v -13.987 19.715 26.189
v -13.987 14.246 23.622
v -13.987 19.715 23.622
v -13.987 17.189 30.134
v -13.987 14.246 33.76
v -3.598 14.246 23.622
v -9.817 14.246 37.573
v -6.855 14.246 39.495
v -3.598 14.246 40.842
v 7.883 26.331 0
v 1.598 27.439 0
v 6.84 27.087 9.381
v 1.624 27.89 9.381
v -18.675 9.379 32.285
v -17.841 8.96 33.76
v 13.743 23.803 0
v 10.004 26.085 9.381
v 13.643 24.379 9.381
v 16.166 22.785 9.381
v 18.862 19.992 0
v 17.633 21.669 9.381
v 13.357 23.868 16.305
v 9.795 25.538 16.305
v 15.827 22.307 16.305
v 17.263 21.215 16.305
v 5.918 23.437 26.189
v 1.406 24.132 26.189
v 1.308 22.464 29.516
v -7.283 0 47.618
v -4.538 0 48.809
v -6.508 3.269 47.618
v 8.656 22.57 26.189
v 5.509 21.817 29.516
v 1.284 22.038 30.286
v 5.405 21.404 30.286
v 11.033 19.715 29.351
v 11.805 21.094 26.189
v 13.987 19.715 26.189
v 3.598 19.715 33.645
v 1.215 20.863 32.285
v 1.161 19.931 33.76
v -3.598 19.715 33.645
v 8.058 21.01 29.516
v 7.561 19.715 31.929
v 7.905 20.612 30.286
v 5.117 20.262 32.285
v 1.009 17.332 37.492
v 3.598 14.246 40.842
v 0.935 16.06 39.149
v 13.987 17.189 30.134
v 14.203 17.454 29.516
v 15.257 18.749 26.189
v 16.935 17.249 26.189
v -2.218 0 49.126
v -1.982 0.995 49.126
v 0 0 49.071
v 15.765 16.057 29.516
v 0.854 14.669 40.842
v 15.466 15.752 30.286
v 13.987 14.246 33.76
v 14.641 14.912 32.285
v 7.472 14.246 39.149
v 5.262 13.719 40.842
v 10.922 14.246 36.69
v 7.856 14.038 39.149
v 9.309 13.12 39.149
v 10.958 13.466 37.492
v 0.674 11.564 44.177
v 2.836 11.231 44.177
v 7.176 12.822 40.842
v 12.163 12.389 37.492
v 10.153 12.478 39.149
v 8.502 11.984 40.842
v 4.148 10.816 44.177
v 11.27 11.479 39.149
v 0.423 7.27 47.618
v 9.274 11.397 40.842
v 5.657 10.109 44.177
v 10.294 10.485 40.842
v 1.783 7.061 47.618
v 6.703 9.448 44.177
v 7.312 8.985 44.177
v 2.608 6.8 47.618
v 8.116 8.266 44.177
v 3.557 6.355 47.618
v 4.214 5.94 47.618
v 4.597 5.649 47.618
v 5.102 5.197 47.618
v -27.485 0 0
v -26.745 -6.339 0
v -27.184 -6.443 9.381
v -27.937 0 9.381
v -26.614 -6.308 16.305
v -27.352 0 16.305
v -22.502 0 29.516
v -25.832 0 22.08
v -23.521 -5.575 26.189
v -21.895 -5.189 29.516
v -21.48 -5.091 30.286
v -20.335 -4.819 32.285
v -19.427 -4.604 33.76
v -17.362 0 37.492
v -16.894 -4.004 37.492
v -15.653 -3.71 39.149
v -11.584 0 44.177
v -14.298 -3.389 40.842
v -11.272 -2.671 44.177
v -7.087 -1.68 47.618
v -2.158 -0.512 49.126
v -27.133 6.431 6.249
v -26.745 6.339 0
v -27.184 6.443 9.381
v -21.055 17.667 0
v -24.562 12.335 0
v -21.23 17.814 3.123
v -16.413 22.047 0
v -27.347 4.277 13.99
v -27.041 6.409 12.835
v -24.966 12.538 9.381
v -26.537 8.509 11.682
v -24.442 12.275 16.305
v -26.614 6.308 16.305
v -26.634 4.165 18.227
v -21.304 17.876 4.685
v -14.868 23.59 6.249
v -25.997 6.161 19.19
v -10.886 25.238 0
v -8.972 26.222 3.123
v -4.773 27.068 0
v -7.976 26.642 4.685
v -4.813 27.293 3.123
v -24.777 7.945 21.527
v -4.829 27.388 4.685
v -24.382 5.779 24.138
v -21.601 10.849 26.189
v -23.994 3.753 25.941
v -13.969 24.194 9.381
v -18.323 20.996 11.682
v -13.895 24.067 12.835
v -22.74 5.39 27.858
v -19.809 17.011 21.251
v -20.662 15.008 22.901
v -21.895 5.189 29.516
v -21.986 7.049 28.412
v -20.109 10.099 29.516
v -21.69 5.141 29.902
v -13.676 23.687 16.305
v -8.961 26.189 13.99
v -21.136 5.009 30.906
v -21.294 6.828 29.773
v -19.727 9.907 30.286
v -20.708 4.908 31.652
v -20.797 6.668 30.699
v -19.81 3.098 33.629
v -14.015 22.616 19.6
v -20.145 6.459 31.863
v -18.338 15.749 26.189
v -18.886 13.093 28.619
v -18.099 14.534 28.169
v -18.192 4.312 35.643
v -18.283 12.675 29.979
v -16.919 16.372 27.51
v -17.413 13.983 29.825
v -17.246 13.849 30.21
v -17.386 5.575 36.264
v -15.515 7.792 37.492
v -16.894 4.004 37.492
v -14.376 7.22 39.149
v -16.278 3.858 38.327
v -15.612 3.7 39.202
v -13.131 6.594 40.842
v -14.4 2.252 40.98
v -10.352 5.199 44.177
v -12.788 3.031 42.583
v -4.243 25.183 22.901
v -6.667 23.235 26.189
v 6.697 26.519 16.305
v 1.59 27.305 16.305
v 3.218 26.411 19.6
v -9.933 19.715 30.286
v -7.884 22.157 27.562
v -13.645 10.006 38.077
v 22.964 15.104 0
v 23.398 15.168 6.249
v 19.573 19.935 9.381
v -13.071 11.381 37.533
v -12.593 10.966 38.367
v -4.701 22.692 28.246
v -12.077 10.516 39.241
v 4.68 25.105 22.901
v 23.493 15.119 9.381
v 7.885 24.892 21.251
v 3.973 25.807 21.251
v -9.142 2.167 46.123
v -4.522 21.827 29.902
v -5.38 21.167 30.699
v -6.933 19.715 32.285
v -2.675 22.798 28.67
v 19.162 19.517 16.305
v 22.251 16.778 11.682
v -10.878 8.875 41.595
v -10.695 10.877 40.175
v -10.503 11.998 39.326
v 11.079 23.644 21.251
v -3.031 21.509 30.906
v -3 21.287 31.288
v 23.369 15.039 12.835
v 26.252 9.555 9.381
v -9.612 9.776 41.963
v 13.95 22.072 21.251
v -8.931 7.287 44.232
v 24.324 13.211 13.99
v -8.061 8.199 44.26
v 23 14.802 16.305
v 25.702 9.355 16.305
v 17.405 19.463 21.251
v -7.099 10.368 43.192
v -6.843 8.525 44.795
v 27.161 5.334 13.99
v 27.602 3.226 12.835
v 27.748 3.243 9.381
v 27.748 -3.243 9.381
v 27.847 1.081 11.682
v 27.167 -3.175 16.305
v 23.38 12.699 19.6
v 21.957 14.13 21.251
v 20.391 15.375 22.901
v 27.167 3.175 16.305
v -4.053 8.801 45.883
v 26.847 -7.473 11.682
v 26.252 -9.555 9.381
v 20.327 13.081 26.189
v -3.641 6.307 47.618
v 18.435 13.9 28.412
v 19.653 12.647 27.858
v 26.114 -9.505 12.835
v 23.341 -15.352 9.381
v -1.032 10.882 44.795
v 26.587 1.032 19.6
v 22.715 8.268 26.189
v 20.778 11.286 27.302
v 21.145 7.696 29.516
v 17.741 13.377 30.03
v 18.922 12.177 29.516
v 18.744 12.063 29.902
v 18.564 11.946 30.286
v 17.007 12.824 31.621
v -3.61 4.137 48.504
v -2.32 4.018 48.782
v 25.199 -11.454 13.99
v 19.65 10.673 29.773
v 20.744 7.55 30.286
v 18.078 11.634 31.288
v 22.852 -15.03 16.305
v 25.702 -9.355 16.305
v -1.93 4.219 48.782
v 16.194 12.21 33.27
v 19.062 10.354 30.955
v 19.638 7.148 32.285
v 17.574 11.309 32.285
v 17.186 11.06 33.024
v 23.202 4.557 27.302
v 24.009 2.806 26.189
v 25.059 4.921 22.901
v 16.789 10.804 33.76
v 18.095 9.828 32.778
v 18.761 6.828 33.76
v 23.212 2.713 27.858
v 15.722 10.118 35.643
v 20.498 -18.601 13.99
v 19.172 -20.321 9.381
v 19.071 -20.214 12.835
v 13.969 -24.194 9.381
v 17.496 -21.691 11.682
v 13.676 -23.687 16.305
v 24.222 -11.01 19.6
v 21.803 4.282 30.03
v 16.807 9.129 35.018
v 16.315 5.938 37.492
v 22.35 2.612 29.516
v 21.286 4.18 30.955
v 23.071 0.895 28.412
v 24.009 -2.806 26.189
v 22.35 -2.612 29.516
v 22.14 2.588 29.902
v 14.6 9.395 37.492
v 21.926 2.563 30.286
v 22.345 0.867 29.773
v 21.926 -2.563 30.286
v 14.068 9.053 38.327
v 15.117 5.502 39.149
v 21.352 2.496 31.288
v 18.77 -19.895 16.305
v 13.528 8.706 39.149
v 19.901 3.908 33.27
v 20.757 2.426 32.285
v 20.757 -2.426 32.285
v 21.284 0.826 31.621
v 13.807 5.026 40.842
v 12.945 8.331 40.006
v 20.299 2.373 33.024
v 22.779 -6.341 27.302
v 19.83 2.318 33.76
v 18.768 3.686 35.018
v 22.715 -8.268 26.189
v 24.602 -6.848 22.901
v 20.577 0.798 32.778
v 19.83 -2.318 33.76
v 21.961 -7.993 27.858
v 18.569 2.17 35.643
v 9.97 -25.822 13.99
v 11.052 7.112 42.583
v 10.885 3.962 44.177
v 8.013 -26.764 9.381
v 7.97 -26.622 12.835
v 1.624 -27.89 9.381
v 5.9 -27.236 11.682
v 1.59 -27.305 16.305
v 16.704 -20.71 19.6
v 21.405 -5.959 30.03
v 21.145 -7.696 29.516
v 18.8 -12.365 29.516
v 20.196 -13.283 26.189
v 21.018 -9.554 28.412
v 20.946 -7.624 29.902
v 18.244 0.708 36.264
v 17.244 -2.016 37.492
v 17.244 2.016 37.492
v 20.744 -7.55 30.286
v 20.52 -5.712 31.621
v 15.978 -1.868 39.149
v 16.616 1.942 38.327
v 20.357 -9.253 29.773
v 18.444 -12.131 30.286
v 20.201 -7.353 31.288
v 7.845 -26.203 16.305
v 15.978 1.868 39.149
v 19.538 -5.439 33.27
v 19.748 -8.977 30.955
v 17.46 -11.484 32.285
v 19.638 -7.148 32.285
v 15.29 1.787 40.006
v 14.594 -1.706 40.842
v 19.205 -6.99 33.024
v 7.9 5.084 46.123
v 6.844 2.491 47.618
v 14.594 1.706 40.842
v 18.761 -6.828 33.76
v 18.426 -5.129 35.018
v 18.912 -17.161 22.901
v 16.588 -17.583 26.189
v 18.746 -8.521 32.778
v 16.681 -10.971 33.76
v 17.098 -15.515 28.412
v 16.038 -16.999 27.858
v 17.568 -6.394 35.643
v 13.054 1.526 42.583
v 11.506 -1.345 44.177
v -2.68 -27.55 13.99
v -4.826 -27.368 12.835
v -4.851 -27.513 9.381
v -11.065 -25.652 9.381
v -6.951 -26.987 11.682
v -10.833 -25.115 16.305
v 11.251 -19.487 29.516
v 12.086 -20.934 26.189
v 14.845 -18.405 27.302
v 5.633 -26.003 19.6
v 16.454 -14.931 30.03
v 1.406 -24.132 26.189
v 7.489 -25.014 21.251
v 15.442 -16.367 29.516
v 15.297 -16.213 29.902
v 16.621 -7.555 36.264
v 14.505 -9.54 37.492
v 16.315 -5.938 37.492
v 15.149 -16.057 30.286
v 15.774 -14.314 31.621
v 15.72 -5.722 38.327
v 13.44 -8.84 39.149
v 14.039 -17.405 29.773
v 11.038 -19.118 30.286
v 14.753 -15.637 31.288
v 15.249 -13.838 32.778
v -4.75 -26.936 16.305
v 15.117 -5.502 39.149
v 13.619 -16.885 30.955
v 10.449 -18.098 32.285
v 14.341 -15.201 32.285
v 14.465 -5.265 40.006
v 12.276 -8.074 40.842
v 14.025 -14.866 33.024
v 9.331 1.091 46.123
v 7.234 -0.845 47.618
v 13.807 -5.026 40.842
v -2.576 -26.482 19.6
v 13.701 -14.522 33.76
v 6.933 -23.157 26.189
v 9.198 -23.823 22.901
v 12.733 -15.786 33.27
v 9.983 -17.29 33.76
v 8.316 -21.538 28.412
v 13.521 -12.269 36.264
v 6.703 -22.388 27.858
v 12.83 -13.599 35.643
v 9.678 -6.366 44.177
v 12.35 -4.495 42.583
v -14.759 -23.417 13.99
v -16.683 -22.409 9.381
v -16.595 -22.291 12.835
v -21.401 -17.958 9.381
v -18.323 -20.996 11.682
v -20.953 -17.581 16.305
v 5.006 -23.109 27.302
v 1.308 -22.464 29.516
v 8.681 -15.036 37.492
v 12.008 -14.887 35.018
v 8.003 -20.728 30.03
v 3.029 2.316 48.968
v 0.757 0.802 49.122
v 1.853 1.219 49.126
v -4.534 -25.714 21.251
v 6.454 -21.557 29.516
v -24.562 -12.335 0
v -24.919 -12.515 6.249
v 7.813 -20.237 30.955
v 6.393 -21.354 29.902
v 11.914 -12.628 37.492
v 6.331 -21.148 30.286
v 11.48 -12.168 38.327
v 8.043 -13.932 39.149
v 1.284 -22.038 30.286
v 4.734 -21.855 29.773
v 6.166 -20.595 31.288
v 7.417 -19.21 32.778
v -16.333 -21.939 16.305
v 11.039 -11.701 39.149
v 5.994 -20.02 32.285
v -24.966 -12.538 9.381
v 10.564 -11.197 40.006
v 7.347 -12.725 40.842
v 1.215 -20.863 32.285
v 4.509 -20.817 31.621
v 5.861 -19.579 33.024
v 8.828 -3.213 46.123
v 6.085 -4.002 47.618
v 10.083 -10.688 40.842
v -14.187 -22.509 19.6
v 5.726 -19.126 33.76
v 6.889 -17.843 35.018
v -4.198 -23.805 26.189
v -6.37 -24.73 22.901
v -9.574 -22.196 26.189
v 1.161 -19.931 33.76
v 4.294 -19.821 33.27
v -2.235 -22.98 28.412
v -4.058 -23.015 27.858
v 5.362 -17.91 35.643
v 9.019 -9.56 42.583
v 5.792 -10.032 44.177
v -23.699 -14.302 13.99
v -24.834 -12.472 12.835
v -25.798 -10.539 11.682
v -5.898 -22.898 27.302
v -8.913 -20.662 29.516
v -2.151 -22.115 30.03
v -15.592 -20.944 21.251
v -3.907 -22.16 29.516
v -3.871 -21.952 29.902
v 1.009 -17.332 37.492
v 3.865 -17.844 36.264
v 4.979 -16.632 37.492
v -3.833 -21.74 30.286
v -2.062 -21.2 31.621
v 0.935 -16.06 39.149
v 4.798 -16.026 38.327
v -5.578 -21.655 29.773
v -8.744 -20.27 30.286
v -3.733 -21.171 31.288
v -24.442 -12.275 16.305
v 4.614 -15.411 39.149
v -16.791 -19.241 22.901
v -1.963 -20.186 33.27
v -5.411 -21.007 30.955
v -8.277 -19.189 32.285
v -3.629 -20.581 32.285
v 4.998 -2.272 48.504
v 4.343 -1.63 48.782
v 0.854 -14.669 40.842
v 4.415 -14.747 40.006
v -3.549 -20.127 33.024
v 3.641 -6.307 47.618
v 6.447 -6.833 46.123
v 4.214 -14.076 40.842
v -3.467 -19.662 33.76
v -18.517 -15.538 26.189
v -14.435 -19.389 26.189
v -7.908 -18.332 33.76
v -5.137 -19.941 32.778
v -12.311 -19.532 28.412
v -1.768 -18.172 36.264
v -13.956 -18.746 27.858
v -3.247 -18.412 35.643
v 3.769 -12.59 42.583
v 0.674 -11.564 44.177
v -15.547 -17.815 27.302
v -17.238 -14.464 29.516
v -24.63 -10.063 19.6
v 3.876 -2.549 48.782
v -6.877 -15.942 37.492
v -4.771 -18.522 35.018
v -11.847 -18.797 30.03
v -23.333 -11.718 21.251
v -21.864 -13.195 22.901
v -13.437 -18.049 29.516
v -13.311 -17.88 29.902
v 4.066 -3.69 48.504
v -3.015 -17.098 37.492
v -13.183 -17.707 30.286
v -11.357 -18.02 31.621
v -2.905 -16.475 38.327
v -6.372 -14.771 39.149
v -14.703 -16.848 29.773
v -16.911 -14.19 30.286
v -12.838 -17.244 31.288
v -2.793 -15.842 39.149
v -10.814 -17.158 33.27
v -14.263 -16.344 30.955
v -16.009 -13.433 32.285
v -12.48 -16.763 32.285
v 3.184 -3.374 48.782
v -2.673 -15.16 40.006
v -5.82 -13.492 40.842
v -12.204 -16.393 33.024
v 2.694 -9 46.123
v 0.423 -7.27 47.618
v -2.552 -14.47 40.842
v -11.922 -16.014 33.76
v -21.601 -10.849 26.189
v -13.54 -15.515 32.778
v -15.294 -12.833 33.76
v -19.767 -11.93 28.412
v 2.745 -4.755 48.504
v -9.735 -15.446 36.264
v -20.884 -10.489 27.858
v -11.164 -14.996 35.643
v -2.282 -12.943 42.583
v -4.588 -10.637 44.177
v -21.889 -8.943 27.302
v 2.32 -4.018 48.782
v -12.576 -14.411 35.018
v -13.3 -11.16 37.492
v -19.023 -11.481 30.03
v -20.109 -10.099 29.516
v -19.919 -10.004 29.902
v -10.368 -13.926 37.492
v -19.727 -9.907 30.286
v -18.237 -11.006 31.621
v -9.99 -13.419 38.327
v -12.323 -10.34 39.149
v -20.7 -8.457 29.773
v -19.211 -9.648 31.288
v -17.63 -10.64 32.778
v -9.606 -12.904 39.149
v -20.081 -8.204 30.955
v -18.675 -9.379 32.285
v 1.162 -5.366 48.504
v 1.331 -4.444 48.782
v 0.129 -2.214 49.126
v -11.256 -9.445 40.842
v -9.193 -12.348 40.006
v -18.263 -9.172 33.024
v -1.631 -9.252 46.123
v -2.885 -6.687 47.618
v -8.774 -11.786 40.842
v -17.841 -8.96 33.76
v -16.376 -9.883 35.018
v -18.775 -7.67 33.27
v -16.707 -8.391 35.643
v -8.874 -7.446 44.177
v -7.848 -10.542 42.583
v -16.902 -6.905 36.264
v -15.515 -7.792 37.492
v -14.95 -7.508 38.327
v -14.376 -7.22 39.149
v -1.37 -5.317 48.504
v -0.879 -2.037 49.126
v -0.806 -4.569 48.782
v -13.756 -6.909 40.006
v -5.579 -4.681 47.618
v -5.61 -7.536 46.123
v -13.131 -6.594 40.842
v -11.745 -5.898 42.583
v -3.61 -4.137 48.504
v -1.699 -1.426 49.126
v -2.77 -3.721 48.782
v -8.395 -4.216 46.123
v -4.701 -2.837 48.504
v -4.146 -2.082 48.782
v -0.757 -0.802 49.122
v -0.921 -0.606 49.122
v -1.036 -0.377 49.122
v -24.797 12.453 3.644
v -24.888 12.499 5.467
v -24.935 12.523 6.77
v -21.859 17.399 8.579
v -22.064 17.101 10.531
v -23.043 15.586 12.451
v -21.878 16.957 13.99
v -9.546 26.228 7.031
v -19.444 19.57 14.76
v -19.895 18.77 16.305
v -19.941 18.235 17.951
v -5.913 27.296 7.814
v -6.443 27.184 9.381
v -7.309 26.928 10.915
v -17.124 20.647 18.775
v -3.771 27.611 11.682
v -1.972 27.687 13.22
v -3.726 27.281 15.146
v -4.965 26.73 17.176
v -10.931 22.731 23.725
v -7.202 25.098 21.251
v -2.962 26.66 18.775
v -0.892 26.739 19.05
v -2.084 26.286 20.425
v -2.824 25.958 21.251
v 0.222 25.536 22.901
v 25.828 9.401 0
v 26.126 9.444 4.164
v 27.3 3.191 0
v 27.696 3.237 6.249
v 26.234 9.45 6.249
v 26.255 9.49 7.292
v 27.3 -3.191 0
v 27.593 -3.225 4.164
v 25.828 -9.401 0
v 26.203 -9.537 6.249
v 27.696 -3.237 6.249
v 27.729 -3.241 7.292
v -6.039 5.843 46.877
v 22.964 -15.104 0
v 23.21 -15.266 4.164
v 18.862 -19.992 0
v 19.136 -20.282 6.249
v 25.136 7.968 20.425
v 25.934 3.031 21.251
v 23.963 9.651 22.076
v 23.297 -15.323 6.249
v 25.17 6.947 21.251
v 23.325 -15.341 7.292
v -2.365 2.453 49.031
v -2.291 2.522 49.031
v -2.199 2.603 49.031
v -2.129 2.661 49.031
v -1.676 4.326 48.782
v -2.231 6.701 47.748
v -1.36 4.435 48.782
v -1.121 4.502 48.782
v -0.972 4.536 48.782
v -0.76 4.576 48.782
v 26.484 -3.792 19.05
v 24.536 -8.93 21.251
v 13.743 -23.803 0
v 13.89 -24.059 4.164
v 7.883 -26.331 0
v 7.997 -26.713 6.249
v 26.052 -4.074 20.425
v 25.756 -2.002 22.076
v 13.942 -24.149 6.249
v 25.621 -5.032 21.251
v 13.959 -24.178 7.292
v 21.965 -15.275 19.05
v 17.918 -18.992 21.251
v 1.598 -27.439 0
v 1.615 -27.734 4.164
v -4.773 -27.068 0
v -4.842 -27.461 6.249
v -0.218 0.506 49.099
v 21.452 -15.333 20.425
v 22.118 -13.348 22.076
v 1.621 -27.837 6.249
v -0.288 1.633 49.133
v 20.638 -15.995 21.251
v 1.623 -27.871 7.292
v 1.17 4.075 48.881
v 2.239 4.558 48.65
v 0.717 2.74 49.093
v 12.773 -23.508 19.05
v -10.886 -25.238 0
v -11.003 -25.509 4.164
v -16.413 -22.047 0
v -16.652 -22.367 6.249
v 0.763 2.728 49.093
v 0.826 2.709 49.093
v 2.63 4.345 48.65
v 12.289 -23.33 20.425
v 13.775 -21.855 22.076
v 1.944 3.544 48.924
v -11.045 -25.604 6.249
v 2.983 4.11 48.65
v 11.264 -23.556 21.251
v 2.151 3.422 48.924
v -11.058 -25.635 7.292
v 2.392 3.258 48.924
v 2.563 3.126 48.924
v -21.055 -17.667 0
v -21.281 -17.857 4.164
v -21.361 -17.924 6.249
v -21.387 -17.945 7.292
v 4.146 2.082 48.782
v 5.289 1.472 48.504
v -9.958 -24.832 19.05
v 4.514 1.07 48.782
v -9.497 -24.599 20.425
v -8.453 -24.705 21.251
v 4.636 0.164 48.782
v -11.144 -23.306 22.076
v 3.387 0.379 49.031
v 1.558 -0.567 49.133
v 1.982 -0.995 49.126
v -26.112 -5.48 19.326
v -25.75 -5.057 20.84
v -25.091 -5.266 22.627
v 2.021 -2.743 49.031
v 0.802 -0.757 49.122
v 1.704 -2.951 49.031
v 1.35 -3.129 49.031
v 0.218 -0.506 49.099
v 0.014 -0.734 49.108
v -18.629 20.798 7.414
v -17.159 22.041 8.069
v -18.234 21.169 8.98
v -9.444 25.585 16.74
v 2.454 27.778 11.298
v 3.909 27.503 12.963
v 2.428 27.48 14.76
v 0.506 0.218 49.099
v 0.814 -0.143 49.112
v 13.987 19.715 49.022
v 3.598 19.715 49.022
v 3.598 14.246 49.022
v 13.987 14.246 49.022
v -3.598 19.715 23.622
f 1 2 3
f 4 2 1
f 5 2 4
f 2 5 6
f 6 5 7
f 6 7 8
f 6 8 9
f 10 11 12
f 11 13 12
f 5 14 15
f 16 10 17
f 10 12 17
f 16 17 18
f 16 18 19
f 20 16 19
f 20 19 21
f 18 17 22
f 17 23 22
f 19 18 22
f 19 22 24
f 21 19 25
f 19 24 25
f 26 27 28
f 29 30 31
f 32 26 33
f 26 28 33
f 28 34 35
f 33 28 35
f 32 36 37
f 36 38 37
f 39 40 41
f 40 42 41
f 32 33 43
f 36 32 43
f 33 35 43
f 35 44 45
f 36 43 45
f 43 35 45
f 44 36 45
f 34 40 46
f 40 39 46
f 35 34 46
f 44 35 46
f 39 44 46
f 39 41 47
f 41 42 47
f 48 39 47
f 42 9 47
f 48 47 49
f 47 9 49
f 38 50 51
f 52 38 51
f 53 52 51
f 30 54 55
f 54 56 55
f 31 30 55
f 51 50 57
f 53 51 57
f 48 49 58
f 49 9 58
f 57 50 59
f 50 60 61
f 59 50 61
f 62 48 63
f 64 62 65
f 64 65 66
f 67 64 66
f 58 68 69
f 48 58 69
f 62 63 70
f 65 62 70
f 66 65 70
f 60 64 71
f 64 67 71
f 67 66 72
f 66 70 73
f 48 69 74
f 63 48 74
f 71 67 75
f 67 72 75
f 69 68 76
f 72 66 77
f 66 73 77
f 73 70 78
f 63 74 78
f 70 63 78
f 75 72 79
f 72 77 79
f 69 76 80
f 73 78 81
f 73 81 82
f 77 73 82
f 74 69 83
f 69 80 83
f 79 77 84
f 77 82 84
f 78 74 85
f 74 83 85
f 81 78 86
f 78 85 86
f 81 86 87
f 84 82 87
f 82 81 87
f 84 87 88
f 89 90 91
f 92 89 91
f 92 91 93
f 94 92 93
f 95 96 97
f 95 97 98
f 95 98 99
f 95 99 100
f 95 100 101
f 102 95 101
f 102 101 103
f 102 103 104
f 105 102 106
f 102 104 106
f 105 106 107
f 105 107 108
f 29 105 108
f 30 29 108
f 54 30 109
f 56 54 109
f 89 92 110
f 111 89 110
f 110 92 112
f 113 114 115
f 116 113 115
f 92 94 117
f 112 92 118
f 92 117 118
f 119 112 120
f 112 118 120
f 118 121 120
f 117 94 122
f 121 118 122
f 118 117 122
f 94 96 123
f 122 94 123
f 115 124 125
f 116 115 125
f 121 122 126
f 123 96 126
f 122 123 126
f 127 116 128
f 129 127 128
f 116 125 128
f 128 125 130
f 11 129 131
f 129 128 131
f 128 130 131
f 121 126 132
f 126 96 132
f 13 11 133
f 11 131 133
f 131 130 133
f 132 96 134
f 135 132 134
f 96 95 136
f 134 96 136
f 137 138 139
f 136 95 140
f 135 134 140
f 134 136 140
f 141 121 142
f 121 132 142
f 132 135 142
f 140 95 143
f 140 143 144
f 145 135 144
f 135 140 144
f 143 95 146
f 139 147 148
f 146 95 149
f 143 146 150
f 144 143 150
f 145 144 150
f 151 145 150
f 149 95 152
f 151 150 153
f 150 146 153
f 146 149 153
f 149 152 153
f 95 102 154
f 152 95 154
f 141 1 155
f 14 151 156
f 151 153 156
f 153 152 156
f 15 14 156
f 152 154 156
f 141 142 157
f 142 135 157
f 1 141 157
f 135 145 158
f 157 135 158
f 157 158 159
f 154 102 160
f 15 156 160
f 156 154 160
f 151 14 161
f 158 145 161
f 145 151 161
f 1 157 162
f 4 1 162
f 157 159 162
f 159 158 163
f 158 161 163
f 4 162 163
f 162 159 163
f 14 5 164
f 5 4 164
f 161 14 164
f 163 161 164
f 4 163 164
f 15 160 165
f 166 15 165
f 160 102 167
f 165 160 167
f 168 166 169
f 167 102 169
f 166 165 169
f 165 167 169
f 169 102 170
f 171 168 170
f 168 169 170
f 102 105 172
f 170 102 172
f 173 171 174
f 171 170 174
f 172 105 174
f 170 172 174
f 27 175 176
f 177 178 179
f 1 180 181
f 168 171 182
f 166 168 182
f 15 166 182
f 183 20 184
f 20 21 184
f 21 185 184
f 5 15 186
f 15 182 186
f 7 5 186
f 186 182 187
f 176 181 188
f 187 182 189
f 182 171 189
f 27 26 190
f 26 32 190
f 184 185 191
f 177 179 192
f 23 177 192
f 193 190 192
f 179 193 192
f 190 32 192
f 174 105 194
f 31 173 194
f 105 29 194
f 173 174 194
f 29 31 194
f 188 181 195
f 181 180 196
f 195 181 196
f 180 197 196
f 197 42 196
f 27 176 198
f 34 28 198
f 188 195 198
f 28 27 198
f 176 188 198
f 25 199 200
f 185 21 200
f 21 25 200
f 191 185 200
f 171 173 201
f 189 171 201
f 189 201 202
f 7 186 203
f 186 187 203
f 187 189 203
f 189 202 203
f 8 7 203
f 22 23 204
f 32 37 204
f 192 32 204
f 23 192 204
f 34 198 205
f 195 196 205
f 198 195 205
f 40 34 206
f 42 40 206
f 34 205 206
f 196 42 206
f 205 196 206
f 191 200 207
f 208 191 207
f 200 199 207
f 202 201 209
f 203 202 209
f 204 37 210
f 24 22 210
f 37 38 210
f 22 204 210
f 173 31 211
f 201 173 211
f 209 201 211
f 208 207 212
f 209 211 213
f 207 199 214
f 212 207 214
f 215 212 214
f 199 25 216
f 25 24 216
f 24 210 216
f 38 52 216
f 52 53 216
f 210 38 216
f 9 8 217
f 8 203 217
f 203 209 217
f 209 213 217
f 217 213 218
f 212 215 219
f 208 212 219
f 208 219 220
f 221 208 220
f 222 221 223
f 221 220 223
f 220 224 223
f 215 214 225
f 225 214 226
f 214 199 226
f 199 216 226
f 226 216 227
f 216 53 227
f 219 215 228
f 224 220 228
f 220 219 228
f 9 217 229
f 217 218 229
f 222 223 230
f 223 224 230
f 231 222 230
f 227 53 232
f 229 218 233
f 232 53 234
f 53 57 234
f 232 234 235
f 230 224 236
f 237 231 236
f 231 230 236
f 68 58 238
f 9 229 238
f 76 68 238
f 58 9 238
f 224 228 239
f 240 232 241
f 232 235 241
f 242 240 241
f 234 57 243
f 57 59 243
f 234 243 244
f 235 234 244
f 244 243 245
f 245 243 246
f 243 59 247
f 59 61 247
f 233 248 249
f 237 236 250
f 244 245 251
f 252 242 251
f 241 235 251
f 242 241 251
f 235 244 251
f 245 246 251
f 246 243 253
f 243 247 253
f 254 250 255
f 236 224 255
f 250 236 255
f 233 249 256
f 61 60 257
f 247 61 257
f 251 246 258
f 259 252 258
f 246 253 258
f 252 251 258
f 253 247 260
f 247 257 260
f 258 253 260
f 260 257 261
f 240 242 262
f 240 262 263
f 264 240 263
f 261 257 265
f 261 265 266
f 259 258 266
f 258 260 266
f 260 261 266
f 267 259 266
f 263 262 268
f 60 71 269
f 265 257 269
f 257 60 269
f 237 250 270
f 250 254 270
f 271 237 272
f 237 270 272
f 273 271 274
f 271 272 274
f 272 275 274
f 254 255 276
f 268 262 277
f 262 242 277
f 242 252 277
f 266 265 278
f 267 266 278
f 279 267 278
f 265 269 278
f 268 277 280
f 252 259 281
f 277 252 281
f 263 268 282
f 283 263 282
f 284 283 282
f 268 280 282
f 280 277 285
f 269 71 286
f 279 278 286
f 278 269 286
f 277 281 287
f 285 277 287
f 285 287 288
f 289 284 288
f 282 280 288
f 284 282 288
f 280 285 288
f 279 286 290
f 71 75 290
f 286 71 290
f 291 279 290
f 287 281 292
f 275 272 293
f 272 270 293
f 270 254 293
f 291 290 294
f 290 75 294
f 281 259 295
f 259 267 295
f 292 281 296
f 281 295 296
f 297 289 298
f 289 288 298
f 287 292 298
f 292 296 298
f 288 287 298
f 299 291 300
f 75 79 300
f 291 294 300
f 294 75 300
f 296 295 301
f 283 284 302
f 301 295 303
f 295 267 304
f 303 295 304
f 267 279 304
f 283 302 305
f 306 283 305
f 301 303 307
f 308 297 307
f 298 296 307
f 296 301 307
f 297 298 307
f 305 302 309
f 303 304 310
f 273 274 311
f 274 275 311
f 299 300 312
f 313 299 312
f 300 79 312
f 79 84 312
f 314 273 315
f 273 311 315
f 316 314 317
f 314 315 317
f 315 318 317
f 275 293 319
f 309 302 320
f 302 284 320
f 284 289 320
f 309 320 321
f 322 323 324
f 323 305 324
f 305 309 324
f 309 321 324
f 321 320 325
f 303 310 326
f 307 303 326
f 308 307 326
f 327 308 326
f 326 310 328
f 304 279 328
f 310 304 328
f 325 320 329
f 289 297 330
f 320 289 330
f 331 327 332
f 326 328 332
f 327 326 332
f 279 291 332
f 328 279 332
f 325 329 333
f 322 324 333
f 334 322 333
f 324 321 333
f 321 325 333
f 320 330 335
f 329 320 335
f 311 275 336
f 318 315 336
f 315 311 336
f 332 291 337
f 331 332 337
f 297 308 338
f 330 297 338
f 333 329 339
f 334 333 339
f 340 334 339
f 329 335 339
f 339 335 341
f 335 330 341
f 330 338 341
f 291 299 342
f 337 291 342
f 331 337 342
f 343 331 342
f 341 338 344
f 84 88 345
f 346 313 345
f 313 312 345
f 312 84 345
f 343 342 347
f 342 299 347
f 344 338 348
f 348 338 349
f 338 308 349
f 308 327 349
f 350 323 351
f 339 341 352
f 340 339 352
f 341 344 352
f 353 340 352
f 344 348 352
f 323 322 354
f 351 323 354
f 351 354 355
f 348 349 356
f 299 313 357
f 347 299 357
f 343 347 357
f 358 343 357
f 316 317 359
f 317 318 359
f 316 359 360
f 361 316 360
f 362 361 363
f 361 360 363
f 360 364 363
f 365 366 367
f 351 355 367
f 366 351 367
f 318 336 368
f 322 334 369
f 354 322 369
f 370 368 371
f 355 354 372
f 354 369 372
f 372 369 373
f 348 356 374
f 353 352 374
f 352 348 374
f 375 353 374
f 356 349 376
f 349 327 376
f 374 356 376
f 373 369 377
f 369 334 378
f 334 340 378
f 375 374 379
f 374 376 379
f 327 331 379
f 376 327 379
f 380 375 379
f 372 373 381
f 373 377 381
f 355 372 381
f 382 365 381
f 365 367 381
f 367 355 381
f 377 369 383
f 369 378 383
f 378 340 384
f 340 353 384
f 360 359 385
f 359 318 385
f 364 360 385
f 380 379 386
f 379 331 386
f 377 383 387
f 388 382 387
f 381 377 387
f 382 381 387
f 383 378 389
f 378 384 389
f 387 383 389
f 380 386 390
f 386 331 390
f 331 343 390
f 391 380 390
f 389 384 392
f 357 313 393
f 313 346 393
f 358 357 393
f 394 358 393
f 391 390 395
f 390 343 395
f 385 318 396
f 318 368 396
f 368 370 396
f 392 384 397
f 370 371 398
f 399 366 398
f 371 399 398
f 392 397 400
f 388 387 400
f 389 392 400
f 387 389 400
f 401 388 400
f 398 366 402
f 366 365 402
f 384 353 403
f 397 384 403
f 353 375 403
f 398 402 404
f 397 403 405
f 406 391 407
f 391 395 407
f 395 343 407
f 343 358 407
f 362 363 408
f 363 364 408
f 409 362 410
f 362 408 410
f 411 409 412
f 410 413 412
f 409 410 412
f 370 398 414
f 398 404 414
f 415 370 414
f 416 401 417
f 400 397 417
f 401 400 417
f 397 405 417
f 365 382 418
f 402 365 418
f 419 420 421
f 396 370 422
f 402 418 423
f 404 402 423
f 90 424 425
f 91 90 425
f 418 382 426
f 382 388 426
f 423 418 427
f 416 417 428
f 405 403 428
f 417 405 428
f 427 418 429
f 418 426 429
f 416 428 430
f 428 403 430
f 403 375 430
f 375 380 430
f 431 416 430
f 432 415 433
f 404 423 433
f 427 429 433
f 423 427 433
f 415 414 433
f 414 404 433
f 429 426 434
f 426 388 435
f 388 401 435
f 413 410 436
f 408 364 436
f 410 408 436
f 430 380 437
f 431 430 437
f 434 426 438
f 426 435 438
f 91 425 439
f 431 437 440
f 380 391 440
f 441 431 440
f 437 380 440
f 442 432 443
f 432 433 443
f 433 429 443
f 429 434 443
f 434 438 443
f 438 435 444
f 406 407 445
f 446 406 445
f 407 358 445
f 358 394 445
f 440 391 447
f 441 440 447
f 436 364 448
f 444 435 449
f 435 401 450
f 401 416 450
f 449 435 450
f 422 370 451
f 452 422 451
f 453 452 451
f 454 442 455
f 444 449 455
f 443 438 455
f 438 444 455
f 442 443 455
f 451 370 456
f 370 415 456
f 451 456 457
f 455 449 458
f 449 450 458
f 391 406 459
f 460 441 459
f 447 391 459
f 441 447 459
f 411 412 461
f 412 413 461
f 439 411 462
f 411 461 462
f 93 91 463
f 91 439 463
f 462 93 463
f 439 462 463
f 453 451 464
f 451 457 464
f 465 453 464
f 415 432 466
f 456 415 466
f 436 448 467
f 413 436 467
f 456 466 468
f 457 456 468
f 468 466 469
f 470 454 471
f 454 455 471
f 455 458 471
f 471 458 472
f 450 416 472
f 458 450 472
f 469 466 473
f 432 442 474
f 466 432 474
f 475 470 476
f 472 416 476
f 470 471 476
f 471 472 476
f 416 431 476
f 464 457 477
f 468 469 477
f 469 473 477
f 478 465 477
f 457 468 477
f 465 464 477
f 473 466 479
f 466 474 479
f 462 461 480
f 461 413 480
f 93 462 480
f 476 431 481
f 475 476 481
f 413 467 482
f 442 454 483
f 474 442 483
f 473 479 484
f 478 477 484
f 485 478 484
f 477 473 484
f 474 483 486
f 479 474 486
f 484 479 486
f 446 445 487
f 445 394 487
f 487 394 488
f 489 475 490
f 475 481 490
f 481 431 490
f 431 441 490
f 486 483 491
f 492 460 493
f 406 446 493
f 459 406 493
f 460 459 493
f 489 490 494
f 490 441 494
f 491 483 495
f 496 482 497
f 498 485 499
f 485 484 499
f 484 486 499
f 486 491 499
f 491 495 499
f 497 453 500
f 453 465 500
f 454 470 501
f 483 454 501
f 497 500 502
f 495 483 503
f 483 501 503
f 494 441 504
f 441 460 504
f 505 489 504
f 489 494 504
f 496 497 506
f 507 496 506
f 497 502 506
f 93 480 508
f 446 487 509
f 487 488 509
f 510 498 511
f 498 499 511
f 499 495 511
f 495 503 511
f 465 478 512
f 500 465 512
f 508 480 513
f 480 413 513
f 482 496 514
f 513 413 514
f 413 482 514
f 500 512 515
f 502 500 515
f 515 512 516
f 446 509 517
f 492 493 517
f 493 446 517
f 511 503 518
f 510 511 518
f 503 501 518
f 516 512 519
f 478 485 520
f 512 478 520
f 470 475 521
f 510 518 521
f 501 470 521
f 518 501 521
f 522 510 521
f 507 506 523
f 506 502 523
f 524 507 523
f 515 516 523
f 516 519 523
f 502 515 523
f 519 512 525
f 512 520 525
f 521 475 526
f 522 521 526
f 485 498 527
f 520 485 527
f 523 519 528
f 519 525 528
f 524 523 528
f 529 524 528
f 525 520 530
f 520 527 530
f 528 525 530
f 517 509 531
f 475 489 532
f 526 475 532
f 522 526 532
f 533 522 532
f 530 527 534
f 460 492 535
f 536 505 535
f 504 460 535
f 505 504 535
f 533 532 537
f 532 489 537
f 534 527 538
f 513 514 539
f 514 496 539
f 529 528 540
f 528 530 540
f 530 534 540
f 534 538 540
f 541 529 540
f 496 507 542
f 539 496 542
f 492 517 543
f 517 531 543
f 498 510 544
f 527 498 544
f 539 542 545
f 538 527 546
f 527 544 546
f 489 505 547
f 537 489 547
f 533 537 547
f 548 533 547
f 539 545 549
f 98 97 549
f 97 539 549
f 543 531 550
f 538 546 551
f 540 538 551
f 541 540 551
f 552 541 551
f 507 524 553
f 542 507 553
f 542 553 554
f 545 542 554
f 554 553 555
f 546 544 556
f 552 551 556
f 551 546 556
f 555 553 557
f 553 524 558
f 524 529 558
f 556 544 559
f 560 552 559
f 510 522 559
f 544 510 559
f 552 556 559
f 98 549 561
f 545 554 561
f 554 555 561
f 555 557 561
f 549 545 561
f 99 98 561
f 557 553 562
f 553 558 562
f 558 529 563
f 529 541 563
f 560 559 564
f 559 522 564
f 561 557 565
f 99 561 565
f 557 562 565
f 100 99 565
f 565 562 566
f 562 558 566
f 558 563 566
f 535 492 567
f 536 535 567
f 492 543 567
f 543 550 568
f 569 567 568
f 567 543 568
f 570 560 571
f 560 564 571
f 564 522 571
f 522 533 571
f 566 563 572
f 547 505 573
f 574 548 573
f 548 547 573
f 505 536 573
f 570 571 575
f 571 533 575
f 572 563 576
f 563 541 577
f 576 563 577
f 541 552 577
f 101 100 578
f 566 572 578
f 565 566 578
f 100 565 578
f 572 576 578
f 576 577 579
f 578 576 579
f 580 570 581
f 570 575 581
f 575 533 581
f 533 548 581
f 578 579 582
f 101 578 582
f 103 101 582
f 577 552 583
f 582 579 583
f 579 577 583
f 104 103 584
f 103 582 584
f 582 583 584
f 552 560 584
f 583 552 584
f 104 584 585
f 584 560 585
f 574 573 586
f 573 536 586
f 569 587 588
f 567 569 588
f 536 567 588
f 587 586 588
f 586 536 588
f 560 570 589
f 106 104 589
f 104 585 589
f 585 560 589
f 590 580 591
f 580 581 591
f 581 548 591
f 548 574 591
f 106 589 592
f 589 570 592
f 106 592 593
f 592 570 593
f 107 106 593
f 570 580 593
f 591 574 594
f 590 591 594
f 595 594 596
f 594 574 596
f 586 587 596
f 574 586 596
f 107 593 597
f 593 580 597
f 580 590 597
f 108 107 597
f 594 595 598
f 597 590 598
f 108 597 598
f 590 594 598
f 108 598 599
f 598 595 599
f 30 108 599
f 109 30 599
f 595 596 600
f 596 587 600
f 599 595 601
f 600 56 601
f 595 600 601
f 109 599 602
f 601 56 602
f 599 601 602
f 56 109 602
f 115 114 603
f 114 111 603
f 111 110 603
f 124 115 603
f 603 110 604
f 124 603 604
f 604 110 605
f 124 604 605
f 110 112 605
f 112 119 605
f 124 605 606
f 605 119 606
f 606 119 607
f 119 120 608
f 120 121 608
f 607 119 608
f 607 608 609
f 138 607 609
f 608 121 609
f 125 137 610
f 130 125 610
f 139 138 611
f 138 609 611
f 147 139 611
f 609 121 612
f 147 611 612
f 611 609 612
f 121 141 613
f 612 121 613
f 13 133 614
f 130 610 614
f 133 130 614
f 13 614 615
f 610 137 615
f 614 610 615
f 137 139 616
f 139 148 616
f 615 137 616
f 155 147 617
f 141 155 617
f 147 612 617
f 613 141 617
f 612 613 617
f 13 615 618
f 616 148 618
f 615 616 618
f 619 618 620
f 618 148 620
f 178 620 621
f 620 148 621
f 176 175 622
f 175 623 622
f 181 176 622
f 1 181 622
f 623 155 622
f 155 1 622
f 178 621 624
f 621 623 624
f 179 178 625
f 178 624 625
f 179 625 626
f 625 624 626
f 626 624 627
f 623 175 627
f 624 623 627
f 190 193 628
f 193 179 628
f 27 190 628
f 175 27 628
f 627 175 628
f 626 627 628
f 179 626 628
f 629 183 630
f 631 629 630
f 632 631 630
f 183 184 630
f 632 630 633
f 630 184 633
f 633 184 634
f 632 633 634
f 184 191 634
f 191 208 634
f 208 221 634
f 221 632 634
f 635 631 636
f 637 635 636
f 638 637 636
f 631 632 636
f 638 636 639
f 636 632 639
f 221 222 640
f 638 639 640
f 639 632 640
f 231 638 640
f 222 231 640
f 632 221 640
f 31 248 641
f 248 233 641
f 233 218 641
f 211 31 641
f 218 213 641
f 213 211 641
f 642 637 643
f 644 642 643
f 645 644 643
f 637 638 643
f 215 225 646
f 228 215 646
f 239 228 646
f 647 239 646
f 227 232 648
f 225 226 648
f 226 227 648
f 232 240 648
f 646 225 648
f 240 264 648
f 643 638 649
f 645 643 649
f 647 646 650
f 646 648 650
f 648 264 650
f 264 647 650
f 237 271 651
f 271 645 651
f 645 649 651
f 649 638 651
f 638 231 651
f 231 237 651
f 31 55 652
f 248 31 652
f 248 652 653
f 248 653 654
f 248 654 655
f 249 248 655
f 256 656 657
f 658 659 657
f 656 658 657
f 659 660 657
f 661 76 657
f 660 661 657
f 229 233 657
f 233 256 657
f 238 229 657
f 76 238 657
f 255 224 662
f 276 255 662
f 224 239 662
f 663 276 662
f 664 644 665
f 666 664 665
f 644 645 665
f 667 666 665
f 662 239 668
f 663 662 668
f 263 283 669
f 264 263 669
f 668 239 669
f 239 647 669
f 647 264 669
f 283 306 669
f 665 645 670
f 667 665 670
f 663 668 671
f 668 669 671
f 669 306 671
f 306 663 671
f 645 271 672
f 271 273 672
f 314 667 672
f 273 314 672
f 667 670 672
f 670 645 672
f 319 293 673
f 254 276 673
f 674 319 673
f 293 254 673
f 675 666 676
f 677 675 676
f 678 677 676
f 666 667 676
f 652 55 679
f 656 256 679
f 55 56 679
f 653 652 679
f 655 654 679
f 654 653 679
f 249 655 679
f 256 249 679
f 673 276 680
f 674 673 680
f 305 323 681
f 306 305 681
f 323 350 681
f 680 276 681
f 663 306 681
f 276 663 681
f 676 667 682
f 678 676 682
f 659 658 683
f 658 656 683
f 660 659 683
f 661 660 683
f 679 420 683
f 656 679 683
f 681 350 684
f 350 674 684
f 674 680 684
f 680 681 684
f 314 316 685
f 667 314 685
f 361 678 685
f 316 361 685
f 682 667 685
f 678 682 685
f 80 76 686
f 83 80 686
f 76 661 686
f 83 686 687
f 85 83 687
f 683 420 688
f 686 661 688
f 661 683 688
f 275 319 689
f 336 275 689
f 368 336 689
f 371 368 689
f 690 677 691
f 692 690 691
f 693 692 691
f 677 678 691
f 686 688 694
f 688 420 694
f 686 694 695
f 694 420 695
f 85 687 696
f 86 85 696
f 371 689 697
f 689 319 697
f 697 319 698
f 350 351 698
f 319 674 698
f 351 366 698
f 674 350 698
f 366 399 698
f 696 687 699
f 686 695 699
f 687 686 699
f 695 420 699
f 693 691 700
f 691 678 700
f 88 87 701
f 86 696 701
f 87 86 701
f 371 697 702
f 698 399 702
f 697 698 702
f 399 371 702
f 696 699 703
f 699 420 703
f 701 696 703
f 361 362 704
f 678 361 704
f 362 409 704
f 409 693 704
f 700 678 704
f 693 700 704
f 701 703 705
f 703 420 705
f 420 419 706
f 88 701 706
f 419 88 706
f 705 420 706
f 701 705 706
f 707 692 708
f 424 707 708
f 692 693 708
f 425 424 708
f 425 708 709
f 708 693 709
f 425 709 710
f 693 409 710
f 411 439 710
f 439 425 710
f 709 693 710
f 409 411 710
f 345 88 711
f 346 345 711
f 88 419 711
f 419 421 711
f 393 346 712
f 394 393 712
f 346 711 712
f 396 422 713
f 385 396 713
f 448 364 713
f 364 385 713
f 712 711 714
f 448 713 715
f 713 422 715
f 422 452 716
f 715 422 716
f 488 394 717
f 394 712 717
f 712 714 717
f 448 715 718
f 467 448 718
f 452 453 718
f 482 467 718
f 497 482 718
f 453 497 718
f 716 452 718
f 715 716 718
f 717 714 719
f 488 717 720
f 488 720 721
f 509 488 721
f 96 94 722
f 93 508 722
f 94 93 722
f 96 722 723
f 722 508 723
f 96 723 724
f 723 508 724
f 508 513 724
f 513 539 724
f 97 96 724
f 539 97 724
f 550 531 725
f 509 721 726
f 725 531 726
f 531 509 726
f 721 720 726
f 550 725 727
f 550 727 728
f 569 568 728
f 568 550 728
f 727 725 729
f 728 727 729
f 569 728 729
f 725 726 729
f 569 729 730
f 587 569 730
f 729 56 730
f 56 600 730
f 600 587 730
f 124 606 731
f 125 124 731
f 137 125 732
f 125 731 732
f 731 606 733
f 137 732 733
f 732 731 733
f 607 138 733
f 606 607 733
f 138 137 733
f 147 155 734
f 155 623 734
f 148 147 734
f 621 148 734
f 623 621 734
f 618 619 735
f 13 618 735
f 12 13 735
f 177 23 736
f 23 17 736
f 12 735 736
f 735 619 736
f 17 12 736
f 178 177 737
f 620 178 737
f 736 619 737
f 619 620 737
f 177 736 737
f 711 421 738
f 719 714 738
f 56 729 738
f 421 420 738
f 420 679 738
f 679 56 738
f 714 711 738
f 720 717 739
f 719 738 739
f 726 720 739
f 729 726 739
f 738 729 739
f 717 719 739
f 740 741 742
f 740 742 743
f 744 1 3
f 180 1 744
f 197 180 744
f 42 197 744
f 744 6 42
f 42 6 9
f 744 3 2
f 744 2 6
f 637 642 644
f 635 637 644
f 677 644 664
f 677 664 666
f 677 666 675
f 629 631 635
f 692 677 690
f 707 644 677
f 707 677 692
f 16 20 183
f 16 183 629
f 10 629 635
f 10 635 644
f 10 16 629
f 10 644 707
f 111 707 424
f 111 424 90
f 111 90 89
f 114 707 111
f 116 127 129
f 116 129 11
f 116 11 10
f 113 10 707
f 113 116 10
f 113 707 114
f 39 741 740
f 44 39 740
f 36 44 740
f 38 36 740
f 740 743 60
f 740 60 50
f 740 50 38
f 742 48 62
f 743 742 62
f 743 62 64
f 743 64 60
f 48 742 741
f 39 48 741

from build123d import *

# Parameters (mm, degrees)
F3_W     = 10.3897844814
F3_H     = 5.468309857
F4_DEPTH = 52.578
F5_DEPTH = 25.4


with BuildPart() as f1:
    # F0 (on Front) → F1 (revolve)
    with BuildSketch(Plane.XZ):
        with BuildLine():
            Line((0, 0), (0, 38.4220667183))
            Line((0, 38.4220667183), (0, 49.070879817))
            add(Edge.make_bspline(
                [(-27.4854507297, 0), (-27.9196571576, 5.6795171635), (-28.8301087382, 17.5884274105), (-19.8158202139, 35.7983770168), (-7.1845732595, 49.4544851436), (-1.955675103, 49.1752990162), (0, 49.070879817)],
                knots=[0, 0, 0, 0, 0.2694193541, 0.5649231817, 0.8372756791, 1, 1, 1, 1], degree=3))
            Line((-27.4854507297, 0), (0, 0))
        make_face()
    revolve(axis=Axis((0, 0, 2.0146388561), (0, 0, -1)))

    # F3 (on offset) → F4 (cut)
    with BuildSketch(Plane.XY.offset(76.2)):
        with Locations((-8.7924644537, 16.9805395417)):
            Rectangle(F3_W, F3_H)
        with Locations((8.7924644537, 16.9805395417)):
            Rectangle(F3_W, F3_H)
    extrude(amount=-F4_DEPTH, mode=Mode.SUBTRACT)

    # F5 (add): a face of the model
    f5_faces = [f1.faces().sort_by_distance(p)[0] for p in [
        (8.7924644537, 16.9805395417, 23.622),
    ]]
    extrude(f5_faces, amount=F5_DEPTH)


solid = f1.part
